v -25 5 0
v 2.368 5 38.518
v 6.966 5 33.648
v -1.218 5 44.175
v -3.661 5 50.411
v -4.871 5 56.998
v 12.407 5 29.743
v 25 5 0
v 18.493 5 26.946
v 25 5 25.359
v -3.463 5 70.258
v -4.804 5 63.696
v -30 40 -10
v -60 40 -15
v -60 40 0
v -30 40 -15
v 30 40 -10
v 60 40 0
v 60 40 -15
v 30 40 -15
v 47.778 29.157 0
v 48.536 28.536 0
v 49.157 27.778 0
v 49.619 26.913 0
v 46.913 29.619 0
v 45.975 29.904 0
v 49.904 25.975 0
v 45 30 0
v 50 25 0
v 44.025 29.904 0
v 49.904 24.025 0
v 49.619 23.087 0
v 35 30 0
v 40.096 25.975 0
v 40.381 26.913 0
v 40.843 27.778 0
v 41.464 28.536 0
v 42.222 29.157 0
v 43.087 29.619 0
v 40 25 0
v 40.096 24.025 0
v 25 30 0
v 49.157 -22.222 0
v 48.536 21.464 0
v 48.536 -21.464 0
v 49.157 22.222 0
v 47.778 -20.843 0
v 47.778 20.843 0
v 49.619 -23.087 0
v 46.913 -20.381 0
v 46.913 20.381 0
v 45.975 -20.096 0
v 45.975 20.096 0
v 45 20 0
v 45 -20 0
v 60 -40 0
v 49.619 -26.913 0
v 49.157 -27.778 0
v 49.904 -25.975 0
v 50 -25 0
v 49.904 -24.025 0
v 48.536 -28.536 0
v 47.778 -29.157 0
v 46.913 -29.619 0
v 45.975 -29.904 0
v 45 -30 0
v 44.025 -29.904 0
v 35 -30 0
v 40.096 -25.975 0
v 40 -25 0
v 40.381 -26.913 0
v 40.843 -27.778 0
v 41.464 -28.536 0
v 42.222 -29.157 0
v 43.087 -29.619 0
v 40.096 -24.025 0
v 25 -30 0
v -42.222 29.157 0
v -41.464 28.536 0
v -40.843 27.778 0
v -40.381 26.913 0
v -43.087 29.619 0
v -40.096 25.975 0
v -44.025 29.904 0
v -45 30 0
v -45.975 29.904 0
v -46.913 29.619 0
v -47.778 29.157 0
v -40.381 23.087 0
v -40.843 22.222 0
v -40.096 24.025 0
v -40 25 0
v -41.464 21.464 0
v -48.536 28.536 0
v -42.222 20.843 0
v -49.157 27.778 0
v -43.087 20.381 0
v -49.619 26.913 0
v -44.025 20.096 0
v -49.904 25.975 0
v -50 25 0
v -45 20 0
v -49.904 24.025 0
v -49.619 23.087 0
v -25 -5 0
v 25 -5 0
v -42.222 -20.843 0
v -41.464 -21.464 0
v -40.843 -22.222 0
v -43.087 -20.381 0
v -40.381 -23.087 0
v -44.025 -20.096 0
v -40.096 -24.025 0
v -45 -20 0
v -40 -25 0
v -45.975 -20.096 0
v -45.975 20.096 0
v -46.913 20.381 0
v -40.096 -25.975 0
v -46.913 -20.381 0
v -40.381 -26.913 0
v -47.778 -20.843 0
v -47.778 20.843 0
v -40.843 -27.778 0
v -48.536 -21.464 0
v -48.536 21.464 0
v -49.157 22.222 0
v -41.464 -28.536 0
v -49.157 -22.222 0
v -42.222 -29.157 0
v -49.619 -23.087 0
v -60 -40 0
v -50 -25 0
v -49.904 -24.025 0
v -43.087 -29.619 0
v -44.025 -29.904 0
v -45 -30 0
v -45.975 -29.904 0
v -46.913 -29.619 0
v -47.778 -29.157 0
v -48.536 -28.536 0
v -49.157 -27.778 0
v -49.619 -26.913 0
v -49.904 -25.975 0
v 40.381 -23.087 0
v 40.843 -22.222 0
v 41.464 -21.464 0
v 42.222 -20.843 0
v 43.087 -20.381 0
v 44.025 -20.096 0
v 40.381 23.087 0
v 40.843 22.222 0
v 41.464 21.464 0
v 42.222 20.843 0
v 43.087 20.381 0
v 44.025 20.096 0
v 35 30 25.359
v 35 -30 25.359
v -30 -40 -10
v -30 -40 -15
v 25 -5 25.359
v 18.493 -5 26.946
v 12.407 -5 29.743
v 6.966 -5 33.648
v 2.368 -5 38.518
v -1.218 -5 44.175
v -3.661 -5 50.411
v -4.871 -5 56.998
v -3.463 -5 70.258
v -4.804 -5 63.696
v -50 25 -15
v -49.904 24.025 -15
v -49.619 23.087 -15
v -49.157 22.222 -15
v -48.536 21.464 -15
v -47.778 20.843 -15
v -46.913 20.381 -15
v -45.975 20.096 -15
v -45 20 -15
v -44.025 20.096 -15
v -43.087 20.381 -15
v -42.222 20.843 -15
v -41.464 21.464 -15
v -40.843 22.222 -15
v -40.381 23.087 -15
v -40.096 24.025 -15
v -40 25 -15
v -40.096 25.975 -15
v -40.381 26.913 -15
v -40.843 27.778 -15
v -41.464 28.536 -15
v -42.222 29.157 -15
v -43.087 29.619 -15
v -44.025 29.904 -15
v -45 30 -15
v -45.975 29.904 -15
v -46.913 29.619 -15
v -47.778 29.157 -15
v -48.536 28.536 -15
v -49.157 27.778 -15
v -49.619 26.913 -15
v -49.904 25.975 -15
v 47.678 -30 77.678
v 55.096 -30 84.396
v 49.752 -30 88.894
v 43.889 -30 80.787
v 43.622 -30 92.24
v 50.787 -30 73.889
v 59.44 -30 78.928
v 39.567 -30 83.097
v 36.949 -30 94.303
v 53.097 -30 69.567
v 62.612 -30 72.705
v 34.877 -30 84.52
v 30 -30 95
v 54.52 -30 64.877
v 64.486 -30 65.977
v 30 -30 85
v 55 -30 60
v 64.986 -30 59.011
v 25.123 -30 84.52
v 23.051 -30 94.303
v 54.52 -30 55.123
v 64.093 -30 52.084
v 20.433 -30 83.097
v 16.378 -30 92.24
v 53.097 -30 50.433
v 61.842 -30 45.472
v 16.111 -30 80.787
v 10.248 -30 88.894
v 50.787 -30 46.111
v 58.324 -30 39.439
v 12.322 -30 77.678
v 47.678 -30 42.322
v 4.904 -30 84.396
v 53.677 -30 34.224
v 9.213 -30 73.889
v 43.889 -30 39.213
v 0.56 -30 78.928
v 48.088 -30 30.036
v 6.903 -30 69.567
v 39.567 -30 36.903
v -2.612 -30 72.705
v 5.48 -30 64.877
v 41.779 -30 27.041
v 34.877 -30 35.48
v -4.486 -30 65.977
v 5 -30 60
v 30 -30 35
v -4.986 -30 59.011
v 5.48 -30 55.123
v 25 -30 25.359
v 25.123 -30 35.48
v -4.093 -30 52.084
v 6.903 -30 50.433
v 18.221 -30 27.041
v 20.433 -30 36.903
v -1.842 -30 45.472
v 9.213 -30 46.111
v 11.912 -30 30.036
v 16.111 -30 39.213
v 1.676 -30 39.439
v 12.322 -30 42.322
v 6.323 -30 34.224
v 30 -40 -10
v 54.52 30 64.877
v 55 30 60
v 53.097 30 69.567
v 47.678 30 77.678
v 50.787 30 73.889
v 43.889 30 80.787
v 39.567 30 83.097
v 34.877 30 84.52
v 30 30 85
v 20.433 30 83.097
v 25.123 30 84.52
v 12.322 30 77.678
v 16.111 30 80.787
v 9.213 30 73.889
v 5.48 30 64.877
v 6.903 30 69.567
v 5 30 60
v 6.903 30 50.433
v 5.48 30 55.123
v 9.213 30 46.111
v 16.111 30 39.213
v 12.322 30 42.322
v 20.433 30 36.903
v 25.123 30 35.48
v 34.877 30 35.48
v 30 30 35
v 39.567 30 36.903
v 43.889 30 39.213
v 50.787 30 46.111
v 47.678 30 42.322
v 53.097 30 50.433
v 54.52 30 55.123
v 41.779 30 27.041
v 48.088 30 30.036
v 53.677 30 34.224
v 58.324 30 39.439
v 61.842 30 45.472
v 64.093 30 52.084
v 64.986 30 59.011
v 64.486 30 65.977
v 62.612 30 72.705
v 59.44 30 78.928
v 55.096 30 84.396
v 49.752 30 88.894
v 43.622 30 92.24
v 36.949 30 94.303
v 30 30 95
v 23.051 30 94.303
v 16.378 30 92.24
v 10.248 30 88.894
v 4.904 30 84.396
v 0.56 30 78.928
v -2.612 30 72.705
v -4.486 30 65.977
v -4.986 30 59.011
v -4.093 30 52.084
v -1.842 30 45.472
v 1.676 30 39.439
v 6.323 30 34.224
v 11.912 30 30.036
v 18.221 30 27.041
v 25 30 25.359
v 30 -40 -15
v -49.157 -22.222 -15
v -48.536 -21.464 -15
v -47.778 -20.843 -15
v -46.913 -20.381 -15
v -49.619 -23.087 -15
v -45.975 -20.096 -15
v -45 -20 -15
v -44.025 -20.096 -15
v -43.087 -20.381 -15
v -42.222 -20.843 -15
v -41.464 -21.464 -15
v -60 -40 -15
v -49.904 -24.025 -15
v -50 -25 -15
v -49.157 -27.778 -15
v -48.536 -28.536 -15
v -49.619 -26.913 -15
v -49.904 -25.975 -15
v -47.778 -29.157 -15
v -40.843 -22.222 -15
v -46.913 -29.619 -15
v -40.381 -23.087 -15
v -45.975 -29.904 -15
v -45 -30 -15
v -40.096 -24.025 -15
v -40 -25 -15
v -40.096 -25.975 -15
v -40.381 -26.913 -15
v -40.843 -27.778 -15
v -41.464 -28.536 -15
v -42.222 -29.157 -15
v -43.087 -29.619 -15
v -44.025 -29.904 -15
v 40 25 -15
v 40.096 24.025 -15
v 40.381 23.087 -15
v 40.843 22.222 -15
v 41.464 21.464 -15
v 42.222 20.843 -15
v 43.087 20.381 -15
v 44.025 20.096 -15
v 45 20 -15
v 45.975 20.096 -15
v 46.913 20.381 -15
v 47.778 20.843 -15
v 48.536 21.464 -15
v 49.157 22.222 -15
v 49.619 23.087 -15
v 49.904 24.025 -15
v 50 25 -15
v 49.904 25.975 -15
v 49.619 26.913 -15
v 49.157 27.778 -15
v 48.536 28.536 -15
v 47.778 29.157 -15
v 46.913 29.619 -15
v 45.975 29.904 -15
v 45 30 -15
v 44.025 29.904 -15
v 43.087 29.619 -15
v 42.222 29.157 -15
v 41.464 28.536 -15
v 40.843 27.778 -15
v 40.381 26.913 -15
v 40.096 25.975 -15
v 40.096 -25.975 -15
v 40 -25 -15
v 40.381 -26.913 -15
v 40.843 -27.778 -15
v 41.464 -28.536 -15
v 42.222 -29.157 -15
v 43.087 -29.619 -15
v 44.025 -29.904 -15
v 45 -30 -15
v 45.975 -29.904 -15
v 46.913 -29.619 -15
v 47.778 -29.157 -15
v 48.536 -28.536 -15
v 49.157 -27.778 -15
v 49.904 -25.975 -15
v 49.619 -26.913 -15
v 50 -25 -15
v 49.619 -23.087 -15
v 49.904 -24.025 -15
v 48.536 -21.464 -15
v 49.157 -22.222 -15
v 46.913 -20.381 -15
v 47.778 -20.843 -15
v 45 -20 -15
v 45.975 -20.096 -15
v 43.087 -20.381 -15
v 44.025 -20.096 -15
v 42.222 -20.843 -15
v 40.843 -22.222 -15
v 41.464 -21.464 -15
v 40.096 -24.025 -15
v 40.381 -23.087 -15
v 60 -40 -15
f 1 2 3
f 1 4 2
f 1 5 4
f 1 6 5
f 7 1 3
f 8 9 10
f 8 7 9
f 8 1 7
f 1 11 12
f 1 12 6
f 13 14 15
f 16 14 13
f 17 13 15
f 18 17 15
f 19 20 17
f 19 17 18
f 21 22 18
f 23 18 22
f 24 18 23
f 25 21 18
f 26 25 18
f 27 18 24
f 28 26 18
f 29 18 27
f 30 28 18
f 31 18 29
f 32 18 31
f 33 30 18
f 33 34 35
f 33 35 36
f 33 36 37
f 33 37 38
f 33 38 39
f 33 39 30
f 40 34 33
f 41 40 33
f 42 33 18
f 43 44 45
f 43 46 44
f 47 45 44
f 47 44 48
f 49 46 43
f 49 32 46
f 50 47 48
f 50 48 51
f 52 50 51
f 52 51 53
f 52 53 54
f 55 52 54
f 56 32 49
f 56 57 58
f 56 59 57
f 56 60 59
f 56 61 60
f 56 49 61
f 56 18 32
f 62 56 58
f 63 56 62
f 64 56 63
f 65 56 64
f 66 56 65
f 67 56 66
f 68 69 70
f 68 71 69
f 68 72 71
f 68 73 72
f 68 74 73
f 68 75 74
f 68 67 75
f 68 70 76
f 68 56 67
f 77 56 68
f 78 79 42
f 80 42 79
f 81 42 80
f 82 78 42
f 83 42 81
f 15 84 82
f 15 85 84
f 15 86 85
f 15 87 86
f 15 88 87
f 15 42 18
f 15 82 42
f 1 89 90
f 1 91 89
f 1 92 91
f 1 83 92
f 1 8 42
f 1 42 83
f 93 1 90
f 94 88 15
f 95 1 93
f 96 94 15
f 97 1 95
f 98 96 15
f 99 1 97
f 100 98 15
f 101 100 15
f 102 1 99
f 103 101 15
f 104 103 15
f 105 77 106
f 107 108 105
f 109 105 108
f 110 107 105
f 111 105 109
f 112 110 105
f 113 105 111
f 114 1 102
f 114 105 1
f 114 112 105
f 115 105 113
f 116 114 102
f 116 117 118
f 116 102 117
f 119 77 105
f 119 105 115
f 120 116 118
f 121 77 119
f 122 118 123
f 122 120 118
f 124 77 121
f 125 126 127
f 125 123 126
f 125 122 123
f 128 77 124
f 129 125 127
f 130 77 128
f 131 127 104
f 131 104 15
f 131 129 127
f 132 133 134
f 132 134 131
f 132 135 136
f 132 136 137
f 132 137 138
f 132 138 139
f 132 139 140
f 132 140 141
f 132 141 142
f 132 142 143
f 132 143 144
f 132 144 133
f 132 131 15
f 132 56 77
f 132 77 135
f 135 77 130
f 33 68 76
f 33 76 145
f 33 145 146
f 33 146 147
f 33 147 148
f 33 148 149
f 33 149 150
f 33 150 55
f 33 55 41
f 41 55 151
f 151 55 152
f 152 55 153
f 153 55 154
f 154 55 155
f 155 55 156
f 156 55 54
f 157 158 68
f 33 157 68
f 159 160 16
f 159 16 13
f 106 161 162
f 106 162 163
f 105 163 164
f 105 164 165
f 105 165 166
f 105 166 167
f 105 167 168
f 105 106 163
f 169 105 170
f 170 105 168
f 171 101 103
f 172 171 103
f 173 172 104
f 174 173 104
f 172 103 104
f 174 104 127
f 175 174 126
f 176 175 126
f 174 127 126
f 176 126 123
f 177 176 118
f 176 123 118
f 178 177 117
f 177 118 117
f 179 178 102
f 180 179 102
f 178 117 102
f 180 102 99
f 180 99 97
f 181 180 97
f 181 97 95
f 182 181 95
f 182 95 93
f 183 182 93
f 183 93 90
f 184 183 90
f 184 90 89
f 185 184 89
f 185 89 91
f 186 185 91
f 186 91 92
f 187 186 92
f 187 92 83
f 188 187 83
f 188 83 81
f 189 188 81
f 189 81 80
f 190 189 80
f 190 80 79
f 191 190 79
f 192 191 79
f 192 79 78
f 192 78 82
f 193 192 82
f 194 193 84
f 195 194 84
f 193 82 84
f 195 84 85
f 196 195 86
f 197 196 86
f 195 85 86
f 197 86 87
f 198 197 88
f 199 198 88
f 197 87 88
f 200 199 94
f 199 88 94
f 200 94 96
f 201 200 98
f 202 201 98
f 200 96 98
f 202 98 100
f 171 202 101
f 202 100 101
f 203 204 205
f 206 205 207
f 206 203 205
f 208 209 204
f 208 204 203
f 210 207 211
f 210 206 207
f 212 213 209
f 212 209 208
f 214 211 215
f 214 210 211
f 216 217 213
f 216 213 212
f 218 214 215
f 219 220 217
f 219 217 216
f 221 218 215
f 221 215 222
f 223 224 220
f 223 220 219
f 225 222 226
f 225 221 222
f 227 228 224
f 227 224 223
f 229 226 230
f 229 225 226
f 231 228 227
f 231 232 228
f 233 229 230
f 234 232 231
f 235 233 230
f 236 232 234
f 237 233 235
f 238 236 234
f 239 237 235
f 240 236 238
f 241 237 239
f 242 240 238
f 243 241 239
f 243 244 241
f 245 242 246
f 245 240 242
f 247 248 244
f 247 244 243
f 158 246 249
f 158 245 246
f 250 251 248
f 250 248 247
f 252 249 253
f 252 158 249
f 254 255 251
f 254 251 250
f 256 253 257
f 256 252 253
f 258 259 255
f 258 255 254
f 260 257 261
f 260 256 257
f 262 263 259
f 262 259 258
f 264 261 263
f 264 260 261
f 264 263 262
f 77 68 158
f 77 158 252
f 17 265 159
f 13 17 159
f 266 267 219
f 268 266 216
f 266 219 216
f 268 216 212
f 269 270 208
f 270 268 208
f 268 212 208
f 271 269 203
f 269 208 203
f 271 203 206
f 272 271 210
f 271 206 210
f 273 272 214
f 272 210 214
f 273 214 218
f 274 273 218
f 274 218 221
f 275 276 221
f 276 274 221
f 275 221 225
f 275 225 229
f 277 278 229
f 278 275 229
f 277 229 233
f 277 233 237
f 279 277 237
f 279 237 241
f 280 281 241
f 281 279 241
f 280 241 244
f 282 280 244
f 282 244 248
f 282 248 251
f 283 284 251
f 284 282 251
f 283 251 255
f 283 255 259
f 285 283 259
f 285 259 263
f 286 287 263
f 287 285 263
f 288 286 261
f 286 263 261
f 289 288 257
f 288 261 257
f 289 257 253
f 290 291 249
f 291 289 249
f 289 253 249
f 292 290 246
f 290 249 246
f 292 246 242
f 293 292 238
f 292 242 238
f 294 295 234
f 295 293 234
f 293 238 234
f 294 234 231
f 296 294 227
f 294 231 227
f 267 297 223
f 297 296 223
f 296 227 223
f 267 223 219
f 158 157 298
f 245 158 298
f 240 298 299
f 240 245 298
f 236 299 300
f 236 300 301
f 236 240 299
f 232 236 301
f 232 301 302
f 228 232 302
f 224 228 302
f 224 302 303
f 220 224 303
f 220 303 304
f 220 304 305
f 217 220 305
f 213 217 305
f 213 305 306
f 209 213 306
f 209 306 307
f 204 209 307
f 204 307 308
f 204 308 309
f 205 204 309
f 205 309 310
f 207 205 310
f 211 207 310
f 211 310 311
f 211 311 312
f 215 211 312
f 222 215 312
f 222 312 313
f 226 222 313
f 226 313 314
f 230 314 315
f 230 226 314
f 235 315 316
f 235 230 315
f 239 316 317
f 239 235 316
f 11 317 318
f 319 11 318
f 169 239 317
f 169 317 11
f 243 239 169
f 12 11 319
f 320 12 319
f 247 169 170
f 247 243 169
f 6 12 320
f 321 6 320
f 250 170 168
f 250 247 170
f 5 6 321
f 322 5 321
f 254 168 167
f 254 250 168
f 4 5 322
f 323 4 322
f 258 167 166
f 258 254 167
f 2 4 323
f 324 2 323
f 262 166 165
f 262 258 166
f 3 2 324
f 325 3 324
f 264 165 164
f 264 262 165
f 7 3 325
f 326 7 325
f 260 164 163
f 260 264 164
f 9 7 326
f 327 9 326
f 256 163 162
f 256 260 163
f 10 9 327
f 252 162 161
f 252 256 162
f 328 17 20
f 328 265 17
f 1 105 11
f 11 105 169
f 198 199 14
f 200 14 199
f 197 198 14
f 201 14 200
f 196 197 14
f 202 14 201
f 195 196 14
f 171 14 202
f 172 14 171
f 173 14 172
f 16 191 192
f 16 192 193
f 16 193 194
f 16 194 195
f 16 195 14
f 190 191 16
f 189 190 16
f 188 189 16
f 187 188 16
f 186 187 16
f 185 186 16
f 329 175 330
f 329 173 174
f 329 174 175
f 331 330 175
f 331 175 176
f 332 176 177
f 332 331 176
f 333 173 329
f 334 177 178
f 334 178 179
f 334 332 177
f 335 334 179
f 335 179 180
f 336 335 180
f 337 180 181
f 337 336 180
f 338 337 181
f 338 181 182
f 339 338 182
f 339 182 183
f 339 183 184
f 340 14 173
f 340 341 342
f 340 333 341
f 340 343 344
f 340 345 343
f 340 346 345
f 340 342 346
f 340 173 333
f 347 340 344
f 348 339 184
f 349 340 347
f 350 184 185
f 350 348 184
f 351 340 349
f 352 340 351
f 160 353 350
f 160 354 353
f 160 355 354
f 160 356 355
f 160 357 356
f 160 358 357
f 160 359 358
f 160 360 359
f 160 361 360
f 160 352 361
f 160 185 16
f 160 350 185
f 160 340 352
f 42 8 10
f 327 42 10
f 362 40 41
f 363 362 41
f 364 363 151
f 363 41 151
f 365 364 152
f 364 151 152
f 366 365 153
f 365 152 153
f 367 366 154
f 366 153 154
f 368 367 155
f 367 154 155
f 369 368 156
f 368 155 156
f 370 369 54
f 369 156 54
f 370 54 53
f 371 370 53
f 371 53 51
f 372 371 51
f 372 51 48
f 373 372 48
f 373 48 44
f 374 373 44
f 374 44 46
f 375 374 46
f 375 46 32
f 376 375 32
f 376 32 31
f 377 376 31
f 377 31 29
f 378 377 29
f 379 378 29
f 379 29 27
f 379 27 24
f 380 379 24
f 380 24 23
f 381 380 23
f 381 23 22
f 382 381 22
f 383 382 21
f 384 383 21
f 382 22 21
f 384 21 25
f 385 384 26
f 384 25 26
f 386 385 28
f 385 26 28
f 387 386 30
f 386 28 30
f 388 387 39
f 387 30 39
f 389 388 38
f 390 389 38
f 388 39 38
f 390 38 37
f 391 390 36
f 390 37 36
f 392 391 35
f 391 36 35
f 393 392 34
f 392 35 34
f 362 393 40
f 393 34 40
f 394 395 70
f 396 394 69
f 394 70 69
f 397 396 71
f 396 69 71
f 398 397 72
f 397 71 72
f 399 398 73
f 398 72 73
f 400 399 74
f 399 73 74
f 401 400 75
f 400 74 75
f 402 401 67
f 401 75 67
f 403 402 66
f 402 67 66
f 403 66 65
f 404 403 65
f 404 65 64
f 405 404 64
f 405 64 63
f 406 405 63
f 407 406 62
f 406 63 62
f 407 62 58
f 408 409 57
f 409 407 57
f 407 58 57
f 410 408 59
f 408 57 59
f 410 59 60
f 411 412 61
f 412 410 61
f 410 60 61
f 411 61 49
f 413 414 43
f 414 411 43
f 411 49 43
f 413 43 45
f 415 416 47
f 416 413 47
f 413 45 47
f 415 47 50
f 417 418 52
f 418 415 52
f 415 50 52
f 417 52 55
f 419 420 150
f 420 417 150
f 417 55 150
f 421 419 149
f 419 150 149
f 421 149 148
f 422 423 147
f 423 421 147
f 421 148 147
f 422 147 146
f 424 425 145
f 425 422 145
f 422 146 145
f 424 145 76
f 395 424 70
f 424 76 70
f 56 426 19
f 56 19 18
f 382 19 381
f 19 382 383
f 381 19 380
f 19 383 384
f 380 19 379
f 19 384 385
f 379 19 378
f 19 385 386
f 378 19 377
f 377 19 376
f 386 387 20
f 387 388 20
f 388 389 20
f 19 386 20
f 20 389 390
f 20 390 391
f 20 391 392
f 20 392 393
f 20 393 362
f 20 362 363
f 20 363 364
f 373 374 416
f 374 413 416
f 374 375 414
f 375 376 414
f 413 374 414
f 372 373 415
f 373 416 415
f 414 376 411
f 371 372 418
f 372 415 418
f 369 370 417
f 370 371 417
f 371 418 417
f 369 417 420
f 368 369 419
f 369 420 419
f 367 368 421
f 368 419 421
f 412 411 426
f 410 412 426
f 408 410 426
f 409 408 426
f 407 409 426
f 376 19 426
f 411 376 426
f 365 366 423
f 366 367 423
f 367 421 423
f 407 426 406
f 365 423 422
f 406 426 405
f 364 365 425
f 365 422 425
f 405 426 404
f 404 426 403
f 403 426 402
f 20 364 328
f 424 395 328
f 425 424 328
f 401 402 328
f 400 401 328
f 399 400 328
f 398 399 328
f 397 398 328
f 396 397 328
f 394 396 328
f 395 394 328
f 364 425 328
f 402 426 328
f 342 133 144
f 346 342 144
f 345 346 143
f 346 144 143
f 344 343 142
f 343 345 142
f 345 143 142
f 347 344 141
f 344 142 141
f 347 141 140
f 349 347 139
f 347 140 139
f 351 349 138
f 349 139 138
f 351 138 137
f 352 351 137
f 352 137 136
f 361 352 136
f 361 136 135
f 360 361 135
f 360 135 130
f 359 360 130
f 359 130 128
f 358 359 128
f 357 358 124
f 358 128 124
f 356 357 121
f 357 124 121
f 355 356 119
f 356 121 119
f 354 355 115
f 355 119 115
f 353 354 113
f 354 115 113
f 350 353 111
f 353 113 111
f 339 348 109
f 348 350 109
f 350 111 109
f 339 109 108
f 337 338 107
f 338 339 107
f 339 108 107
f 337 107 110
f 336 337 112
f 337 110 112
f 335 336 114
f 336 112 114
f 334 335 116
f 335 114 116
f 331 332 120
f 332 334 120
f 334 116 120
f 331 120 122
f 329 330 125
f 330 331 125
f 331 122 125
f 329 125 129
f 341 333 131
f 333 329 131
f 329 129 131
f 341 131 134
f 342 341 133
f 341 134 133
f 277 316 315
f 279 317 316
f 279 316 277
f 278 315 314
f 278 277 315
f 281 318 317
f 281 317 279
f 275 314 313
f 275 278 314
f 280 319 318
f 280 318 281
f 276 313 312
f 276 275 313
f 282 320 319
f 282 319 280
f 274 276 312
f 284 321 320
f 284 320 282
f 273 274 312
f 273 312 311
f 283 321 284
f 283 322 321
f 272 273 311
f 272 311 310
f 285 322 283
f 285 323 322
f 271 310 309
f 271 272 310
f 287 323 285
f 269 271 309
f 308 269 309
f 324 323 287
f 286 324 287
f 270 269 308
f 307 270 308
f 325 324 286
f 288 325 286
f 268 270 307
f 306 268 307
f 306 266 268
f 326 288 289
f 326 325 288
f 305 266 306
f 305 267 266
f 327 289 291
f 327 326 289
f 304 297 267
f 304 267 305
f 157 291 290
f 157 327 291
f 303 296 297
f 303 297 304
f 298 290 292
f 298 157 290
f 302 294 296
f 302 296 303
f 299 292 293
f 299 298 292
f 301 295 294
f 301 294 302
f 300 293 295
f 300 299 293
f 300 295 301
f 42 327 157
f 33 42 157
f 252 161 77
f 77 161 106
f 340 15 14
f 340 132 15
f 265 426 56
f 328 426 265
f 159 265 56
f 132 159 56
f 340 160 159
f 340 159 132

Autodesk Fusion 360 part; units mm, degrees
sketch "Sketch1" plane through (0, 0, 0) normal (0, 1, 0) x (1, 0, 0)
  line L0 (0, 0) -> (60, 0)
  line L1 (0, 0) -> (-60, 0)
  line L2 (-60, 0) -> (-60, 15)
  line L3 (-60, 15) -> (-40, 15)
  line L4 (30, 10) -> (-30, 10)
  line L5 (40, 15) -> (60, 15)
  line L6 (60, 15) -> (60, 0)
  line L7 (-40, 15) -> (-30, 15)
  line L8 (-30, 15) -> (-30, 10)
  line L9 (30, 10) -> (30, 15)
  line L10 (40, 15) -> (30, 15)
  line L11 (60, 0) -> (30, 0)
  line L12 (30, 0) -> (35, 0)
  line L13 (35, 0) -> (25, 0)
  line L14 (25, 0) -> (25, -25.359)
  line L15 (35, -25.359) -> (35, 0)
  arc A0 (25, -25.359) -> (35, -25.359) centre (30, -60) ccw
  circle A1 centre (30, -60) radius 25
  line L16 (25, 0) -> (-30, 0)
  line L17 (-60, 0) -> (-25, 0)
  line L18 (-25, 0) -> (-3.4631, -70.2578)
extrude "Extrude1" add sketch "Sketch1" along normal blind 40 contours L0 L1 L2 L3 L4 L5 L6 L7 L8 L9 L10 L11 L12 L13 L16 L17
extrude "Extrude3" add sketch "Sketch1" along normal blind 30 contours L0 L11 L12 L13 L14 L15 A0
extrude "Extrude2" add sketch "Sketch1" along normal blind 5 contours L0 L1 L14 A0 L16 L18
sketch "Sketch2" plane through (0, 0, 0) normal (0, 0, 1) x (-1, 0, 0)
  line L0 (25, -5) -> (-25, -5)
  line L1 (-25, -5) -> (-25, -30)
  line L2 (-25, -30) -> (-35, -30)
  line L3 (-35, -30) -> (-35, 0)
  line L4 (-35, 0) -> (-60, 0)
  line L5 (-60, 0) -> (-60, -40)
  line L6 (-60, -40) -> (60, -40)
  line L7 (60, -40) -> (60, 0)
  line L8 (60, 0) -> (25, 0)
  line L9 (25, 0) -> (25, -5)
  line L10 (-60, -40) -> (-45, -40)
  line L11 (-45, -40) -> (-45, -25)
  circle A0 centre (-45, -25) radius 5
  line L12 (60, -40) -> (60, -25)
  line L13 (60, -25) -> (45, -25)
  circle A1 centre (45, -25) radius 5
  dimension "d7" = 10
  dimension "d8" = 10
extrude "Extrude4" cut sketch "Sketch2" against normal blind 15 contours A0 | A1
mirror "Mirror1" about plane through (0, 0, 0) normal (0, -1, 0) of bodies 1 merged
